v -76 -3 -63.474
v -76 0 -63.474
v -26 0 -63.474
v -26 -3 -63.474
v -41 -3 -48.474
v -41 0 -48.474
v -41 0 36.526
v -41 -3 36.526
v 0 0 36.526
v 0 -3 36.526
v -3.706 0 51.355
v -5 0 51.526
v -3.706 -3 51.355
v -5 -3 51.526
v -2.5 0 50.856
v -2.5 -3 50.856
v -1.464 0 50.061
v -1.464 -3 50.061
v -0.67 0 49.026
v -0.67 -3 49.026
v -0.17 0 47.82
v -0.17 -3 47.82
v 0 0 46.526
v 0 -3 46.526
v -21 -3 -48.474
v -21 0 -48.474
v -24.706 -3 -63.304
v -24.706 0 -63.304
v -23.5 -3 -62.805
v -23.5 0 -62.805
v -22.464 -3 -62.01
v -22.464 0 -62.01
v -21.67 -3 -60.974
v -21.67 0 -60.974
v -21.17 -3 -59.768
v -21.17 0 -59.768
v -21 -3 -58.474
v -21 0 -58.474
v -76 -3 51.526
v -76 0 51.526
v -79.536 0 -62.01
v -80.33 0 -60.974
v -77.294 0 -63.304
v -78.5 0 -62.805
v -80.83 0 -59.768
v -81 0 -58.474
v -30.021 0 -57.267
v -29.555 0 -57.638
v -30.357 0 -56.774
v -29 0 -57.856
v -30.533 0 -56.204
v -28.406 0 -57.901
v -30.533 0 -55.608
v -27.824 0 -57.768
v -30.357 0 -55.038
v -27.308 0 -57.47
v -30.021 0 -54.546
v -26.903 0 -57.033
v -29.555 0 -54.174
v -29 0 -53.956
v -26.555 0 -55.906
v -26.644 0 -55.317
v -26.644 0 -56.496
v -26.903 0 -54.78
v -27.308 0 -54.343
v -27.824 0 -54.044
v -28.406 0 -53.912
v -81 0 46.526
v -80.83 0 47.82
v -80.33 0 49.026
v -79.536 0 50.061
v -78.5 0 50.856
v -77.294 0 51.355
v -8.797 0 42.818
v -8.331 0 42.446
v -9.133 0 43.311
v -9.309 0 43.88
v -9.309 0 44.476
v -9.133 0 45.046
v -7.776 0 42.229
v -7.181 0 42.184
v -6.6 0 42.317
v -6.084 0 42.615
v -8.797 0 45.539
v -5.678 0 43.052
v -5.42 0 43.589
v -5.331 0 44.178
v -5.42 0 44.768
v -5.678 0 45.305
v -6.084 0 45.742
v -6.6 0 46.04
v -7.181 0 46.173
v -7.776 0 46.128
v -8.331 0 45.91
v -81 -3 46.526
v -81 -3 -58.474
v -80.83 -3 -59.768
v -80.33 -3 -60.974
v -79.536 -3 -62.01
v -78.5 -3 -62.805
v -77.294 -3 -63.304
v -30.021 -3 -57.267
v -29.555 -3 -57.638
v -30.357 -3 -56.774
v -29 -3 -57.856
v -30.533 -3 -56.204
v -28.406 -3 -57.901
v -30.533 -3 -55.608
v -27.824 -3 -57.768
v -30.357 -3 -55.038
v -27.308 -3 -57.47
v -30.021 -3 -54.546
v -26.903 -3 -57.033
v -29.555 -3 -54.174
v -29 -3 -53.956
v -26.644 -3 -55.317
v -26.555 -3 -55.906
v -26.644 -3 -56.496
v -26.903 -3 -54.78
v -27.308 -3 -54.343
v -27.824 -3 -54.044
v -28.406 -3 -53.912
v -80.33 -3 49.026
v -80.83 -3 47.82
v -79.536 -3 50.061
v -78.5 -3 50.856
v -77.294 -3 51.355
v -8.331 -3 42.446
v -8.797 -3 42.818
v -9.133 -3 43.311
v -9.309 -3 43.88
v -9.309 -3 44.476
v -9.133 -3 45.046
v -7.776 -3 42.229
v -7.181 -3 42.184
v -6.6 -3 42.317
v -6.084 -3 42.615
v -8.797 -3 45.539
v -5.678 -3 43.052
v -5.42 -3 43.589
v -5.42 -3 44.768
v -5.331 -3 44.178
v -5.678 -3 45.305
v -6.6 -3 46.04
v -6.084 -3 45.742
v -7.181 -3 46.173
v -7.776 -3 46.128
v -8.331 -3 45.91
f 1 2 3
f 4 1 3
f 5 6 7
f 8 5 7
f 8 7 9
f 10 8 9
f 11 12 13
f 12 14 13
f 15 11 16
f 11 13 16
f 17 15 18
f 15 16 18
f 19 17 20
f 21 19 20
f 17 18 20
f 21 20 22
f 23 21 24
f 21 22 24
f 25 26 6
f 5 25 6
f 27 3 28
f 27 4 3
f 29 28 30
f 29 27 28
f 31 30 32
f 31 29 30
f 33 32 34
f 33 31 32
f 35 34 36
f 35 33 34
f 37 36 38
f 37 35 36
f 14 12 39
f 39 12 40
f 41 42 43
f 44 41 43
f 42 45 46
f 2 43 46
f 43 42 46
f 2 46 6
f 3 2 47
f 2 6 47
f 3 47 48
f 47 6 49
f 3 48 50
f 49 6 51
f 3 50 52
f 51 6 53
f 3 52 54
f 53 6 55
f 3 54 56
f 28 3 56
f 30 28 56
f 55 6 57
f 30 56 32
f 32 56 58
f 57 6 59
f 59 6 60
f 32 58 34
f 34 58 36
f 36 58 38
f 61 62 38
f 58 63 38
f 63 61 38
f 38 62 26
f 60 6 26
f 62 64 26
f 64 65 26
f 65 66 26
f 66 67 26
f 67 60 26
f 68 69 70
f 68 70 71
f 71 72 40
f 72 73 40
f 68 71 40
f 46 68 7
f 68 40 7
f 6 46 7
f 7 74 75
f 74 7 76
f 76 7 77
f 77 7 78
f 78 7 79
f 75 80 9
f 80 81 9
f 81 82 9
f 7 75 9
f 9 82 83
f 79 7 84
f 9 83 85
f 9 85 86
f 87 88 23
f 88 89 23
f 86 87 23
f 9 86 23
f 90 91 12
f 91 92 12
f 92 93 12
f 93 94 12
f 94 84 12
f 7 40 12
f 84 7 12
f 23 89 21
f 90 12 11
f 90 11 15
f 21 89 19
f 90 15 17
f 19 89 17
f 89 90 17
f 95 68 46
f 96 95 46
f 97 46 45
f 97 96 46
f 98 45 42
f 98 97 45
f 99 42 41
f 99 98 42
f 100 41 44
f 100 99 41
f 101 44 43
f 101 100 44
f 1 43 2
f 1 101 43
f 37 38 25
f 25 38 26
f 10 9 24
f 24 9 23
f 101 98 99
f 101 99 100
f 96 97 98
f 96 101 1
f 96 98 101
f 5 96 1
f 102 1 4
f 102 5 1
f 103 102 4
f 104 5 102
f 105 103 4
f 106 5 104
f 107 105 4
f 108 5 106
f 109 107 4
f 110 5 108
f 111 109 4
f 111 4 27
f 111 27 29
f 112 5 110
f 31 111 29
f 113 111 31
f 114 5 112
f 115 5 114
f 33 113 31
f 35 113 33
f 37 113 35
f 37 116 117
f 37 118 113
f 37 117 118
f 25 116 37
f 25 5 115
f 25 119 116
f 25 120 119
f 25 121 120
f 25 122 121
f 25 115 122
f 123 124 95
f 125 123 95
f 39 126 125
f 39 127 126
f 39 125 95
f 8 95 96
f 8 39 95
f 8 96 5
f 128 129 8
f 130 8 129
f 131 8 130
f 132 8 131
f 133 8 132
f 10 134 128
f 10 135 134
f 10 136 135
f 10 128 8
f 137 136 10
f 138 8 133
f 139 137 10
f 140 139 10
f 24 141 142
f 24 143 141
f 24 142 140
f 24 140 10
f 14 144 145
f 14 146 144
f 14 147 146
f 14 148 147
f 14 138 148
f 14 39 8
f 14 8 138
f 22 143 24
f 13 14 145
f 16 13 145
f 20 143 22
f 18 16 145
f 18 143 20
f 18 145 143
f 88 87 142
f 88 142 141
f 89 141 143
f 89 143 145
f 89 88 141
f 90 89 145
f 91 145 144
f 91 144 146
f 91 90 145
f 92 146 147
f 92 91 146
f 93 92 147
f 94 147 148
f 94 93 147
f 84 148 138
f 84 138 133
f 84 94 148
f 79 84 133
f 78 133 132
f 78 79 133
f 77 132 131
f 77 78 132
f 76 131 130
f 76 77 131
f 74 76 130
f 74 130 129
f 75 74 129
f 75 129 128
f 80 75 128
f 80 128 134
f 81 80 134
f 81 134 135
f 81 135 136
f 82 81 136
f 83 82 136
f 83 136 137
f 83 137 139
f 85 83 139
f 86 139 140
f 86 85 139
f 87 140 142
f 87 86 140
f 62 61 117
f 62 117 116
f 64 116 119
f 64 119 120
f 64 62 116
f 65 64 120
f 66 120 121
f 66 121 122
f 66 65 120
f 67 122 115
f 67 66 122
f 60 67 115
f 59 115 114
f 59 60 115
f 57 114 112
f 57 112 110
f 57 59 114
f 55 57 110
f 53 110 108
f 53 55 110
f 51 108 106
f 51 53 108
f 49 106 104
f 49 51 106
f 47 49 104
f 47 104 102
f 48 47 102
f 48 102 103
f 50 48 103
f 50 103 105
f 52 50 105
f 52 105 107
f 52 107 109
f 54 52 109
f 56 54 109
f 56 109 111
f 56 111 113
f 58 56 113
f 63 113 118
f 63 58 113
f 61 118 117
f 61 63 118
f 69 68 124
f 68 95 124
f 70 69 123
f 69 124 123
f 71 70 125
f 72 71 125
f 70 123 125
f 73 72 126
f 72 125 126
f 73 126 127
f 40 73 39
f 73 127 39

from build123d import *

# Parameters (mm, degrees)
F0_R     = 2
F1_DEPTH = 3
F2_R     = 5


# Not quite as in the source:
# - a feature names something its author has since deleted; it is built from what else it names


with BuildPart() as f1:
    # F0 (on Front) → F1 (new body)
    with BuildSketch(Plane.XZ):
        Polygon((-81, 51.5256257355), (-81, -63.4743742645), (-21, -63.4743742645), (-21, -48.4743742645), (-41, -48.4743742645), (-41, -15.9743742645), (-41, 4.0256257355), (-41, 36.5256257355), (0, 36.5256257355), (0, 51.5256257355), align=None)
        with Locations((-28.5549983382, -55.90621382)):
            Circle(F0_R, mode=Mode.SUBTRACT)
        with Locations((-7.3309438303, 44.1784150898)):
            Circle(F0_R, mode=Mode.SUBTRACT)
    extrude(amount=F1_DEPTH)

    # F2
    f2_edges = [f1.edges().sort_by_distance(p)[0] for p in [
        (-81, -1.5, 51.525626),
        (-81, -1.5, -63.474374),
        (0, -1.5, 51.525626),
        (-21, -1.5, -63.474374),
    ]]
    fillet(f2_edges, radius=F2_R)


solid = f1.part
